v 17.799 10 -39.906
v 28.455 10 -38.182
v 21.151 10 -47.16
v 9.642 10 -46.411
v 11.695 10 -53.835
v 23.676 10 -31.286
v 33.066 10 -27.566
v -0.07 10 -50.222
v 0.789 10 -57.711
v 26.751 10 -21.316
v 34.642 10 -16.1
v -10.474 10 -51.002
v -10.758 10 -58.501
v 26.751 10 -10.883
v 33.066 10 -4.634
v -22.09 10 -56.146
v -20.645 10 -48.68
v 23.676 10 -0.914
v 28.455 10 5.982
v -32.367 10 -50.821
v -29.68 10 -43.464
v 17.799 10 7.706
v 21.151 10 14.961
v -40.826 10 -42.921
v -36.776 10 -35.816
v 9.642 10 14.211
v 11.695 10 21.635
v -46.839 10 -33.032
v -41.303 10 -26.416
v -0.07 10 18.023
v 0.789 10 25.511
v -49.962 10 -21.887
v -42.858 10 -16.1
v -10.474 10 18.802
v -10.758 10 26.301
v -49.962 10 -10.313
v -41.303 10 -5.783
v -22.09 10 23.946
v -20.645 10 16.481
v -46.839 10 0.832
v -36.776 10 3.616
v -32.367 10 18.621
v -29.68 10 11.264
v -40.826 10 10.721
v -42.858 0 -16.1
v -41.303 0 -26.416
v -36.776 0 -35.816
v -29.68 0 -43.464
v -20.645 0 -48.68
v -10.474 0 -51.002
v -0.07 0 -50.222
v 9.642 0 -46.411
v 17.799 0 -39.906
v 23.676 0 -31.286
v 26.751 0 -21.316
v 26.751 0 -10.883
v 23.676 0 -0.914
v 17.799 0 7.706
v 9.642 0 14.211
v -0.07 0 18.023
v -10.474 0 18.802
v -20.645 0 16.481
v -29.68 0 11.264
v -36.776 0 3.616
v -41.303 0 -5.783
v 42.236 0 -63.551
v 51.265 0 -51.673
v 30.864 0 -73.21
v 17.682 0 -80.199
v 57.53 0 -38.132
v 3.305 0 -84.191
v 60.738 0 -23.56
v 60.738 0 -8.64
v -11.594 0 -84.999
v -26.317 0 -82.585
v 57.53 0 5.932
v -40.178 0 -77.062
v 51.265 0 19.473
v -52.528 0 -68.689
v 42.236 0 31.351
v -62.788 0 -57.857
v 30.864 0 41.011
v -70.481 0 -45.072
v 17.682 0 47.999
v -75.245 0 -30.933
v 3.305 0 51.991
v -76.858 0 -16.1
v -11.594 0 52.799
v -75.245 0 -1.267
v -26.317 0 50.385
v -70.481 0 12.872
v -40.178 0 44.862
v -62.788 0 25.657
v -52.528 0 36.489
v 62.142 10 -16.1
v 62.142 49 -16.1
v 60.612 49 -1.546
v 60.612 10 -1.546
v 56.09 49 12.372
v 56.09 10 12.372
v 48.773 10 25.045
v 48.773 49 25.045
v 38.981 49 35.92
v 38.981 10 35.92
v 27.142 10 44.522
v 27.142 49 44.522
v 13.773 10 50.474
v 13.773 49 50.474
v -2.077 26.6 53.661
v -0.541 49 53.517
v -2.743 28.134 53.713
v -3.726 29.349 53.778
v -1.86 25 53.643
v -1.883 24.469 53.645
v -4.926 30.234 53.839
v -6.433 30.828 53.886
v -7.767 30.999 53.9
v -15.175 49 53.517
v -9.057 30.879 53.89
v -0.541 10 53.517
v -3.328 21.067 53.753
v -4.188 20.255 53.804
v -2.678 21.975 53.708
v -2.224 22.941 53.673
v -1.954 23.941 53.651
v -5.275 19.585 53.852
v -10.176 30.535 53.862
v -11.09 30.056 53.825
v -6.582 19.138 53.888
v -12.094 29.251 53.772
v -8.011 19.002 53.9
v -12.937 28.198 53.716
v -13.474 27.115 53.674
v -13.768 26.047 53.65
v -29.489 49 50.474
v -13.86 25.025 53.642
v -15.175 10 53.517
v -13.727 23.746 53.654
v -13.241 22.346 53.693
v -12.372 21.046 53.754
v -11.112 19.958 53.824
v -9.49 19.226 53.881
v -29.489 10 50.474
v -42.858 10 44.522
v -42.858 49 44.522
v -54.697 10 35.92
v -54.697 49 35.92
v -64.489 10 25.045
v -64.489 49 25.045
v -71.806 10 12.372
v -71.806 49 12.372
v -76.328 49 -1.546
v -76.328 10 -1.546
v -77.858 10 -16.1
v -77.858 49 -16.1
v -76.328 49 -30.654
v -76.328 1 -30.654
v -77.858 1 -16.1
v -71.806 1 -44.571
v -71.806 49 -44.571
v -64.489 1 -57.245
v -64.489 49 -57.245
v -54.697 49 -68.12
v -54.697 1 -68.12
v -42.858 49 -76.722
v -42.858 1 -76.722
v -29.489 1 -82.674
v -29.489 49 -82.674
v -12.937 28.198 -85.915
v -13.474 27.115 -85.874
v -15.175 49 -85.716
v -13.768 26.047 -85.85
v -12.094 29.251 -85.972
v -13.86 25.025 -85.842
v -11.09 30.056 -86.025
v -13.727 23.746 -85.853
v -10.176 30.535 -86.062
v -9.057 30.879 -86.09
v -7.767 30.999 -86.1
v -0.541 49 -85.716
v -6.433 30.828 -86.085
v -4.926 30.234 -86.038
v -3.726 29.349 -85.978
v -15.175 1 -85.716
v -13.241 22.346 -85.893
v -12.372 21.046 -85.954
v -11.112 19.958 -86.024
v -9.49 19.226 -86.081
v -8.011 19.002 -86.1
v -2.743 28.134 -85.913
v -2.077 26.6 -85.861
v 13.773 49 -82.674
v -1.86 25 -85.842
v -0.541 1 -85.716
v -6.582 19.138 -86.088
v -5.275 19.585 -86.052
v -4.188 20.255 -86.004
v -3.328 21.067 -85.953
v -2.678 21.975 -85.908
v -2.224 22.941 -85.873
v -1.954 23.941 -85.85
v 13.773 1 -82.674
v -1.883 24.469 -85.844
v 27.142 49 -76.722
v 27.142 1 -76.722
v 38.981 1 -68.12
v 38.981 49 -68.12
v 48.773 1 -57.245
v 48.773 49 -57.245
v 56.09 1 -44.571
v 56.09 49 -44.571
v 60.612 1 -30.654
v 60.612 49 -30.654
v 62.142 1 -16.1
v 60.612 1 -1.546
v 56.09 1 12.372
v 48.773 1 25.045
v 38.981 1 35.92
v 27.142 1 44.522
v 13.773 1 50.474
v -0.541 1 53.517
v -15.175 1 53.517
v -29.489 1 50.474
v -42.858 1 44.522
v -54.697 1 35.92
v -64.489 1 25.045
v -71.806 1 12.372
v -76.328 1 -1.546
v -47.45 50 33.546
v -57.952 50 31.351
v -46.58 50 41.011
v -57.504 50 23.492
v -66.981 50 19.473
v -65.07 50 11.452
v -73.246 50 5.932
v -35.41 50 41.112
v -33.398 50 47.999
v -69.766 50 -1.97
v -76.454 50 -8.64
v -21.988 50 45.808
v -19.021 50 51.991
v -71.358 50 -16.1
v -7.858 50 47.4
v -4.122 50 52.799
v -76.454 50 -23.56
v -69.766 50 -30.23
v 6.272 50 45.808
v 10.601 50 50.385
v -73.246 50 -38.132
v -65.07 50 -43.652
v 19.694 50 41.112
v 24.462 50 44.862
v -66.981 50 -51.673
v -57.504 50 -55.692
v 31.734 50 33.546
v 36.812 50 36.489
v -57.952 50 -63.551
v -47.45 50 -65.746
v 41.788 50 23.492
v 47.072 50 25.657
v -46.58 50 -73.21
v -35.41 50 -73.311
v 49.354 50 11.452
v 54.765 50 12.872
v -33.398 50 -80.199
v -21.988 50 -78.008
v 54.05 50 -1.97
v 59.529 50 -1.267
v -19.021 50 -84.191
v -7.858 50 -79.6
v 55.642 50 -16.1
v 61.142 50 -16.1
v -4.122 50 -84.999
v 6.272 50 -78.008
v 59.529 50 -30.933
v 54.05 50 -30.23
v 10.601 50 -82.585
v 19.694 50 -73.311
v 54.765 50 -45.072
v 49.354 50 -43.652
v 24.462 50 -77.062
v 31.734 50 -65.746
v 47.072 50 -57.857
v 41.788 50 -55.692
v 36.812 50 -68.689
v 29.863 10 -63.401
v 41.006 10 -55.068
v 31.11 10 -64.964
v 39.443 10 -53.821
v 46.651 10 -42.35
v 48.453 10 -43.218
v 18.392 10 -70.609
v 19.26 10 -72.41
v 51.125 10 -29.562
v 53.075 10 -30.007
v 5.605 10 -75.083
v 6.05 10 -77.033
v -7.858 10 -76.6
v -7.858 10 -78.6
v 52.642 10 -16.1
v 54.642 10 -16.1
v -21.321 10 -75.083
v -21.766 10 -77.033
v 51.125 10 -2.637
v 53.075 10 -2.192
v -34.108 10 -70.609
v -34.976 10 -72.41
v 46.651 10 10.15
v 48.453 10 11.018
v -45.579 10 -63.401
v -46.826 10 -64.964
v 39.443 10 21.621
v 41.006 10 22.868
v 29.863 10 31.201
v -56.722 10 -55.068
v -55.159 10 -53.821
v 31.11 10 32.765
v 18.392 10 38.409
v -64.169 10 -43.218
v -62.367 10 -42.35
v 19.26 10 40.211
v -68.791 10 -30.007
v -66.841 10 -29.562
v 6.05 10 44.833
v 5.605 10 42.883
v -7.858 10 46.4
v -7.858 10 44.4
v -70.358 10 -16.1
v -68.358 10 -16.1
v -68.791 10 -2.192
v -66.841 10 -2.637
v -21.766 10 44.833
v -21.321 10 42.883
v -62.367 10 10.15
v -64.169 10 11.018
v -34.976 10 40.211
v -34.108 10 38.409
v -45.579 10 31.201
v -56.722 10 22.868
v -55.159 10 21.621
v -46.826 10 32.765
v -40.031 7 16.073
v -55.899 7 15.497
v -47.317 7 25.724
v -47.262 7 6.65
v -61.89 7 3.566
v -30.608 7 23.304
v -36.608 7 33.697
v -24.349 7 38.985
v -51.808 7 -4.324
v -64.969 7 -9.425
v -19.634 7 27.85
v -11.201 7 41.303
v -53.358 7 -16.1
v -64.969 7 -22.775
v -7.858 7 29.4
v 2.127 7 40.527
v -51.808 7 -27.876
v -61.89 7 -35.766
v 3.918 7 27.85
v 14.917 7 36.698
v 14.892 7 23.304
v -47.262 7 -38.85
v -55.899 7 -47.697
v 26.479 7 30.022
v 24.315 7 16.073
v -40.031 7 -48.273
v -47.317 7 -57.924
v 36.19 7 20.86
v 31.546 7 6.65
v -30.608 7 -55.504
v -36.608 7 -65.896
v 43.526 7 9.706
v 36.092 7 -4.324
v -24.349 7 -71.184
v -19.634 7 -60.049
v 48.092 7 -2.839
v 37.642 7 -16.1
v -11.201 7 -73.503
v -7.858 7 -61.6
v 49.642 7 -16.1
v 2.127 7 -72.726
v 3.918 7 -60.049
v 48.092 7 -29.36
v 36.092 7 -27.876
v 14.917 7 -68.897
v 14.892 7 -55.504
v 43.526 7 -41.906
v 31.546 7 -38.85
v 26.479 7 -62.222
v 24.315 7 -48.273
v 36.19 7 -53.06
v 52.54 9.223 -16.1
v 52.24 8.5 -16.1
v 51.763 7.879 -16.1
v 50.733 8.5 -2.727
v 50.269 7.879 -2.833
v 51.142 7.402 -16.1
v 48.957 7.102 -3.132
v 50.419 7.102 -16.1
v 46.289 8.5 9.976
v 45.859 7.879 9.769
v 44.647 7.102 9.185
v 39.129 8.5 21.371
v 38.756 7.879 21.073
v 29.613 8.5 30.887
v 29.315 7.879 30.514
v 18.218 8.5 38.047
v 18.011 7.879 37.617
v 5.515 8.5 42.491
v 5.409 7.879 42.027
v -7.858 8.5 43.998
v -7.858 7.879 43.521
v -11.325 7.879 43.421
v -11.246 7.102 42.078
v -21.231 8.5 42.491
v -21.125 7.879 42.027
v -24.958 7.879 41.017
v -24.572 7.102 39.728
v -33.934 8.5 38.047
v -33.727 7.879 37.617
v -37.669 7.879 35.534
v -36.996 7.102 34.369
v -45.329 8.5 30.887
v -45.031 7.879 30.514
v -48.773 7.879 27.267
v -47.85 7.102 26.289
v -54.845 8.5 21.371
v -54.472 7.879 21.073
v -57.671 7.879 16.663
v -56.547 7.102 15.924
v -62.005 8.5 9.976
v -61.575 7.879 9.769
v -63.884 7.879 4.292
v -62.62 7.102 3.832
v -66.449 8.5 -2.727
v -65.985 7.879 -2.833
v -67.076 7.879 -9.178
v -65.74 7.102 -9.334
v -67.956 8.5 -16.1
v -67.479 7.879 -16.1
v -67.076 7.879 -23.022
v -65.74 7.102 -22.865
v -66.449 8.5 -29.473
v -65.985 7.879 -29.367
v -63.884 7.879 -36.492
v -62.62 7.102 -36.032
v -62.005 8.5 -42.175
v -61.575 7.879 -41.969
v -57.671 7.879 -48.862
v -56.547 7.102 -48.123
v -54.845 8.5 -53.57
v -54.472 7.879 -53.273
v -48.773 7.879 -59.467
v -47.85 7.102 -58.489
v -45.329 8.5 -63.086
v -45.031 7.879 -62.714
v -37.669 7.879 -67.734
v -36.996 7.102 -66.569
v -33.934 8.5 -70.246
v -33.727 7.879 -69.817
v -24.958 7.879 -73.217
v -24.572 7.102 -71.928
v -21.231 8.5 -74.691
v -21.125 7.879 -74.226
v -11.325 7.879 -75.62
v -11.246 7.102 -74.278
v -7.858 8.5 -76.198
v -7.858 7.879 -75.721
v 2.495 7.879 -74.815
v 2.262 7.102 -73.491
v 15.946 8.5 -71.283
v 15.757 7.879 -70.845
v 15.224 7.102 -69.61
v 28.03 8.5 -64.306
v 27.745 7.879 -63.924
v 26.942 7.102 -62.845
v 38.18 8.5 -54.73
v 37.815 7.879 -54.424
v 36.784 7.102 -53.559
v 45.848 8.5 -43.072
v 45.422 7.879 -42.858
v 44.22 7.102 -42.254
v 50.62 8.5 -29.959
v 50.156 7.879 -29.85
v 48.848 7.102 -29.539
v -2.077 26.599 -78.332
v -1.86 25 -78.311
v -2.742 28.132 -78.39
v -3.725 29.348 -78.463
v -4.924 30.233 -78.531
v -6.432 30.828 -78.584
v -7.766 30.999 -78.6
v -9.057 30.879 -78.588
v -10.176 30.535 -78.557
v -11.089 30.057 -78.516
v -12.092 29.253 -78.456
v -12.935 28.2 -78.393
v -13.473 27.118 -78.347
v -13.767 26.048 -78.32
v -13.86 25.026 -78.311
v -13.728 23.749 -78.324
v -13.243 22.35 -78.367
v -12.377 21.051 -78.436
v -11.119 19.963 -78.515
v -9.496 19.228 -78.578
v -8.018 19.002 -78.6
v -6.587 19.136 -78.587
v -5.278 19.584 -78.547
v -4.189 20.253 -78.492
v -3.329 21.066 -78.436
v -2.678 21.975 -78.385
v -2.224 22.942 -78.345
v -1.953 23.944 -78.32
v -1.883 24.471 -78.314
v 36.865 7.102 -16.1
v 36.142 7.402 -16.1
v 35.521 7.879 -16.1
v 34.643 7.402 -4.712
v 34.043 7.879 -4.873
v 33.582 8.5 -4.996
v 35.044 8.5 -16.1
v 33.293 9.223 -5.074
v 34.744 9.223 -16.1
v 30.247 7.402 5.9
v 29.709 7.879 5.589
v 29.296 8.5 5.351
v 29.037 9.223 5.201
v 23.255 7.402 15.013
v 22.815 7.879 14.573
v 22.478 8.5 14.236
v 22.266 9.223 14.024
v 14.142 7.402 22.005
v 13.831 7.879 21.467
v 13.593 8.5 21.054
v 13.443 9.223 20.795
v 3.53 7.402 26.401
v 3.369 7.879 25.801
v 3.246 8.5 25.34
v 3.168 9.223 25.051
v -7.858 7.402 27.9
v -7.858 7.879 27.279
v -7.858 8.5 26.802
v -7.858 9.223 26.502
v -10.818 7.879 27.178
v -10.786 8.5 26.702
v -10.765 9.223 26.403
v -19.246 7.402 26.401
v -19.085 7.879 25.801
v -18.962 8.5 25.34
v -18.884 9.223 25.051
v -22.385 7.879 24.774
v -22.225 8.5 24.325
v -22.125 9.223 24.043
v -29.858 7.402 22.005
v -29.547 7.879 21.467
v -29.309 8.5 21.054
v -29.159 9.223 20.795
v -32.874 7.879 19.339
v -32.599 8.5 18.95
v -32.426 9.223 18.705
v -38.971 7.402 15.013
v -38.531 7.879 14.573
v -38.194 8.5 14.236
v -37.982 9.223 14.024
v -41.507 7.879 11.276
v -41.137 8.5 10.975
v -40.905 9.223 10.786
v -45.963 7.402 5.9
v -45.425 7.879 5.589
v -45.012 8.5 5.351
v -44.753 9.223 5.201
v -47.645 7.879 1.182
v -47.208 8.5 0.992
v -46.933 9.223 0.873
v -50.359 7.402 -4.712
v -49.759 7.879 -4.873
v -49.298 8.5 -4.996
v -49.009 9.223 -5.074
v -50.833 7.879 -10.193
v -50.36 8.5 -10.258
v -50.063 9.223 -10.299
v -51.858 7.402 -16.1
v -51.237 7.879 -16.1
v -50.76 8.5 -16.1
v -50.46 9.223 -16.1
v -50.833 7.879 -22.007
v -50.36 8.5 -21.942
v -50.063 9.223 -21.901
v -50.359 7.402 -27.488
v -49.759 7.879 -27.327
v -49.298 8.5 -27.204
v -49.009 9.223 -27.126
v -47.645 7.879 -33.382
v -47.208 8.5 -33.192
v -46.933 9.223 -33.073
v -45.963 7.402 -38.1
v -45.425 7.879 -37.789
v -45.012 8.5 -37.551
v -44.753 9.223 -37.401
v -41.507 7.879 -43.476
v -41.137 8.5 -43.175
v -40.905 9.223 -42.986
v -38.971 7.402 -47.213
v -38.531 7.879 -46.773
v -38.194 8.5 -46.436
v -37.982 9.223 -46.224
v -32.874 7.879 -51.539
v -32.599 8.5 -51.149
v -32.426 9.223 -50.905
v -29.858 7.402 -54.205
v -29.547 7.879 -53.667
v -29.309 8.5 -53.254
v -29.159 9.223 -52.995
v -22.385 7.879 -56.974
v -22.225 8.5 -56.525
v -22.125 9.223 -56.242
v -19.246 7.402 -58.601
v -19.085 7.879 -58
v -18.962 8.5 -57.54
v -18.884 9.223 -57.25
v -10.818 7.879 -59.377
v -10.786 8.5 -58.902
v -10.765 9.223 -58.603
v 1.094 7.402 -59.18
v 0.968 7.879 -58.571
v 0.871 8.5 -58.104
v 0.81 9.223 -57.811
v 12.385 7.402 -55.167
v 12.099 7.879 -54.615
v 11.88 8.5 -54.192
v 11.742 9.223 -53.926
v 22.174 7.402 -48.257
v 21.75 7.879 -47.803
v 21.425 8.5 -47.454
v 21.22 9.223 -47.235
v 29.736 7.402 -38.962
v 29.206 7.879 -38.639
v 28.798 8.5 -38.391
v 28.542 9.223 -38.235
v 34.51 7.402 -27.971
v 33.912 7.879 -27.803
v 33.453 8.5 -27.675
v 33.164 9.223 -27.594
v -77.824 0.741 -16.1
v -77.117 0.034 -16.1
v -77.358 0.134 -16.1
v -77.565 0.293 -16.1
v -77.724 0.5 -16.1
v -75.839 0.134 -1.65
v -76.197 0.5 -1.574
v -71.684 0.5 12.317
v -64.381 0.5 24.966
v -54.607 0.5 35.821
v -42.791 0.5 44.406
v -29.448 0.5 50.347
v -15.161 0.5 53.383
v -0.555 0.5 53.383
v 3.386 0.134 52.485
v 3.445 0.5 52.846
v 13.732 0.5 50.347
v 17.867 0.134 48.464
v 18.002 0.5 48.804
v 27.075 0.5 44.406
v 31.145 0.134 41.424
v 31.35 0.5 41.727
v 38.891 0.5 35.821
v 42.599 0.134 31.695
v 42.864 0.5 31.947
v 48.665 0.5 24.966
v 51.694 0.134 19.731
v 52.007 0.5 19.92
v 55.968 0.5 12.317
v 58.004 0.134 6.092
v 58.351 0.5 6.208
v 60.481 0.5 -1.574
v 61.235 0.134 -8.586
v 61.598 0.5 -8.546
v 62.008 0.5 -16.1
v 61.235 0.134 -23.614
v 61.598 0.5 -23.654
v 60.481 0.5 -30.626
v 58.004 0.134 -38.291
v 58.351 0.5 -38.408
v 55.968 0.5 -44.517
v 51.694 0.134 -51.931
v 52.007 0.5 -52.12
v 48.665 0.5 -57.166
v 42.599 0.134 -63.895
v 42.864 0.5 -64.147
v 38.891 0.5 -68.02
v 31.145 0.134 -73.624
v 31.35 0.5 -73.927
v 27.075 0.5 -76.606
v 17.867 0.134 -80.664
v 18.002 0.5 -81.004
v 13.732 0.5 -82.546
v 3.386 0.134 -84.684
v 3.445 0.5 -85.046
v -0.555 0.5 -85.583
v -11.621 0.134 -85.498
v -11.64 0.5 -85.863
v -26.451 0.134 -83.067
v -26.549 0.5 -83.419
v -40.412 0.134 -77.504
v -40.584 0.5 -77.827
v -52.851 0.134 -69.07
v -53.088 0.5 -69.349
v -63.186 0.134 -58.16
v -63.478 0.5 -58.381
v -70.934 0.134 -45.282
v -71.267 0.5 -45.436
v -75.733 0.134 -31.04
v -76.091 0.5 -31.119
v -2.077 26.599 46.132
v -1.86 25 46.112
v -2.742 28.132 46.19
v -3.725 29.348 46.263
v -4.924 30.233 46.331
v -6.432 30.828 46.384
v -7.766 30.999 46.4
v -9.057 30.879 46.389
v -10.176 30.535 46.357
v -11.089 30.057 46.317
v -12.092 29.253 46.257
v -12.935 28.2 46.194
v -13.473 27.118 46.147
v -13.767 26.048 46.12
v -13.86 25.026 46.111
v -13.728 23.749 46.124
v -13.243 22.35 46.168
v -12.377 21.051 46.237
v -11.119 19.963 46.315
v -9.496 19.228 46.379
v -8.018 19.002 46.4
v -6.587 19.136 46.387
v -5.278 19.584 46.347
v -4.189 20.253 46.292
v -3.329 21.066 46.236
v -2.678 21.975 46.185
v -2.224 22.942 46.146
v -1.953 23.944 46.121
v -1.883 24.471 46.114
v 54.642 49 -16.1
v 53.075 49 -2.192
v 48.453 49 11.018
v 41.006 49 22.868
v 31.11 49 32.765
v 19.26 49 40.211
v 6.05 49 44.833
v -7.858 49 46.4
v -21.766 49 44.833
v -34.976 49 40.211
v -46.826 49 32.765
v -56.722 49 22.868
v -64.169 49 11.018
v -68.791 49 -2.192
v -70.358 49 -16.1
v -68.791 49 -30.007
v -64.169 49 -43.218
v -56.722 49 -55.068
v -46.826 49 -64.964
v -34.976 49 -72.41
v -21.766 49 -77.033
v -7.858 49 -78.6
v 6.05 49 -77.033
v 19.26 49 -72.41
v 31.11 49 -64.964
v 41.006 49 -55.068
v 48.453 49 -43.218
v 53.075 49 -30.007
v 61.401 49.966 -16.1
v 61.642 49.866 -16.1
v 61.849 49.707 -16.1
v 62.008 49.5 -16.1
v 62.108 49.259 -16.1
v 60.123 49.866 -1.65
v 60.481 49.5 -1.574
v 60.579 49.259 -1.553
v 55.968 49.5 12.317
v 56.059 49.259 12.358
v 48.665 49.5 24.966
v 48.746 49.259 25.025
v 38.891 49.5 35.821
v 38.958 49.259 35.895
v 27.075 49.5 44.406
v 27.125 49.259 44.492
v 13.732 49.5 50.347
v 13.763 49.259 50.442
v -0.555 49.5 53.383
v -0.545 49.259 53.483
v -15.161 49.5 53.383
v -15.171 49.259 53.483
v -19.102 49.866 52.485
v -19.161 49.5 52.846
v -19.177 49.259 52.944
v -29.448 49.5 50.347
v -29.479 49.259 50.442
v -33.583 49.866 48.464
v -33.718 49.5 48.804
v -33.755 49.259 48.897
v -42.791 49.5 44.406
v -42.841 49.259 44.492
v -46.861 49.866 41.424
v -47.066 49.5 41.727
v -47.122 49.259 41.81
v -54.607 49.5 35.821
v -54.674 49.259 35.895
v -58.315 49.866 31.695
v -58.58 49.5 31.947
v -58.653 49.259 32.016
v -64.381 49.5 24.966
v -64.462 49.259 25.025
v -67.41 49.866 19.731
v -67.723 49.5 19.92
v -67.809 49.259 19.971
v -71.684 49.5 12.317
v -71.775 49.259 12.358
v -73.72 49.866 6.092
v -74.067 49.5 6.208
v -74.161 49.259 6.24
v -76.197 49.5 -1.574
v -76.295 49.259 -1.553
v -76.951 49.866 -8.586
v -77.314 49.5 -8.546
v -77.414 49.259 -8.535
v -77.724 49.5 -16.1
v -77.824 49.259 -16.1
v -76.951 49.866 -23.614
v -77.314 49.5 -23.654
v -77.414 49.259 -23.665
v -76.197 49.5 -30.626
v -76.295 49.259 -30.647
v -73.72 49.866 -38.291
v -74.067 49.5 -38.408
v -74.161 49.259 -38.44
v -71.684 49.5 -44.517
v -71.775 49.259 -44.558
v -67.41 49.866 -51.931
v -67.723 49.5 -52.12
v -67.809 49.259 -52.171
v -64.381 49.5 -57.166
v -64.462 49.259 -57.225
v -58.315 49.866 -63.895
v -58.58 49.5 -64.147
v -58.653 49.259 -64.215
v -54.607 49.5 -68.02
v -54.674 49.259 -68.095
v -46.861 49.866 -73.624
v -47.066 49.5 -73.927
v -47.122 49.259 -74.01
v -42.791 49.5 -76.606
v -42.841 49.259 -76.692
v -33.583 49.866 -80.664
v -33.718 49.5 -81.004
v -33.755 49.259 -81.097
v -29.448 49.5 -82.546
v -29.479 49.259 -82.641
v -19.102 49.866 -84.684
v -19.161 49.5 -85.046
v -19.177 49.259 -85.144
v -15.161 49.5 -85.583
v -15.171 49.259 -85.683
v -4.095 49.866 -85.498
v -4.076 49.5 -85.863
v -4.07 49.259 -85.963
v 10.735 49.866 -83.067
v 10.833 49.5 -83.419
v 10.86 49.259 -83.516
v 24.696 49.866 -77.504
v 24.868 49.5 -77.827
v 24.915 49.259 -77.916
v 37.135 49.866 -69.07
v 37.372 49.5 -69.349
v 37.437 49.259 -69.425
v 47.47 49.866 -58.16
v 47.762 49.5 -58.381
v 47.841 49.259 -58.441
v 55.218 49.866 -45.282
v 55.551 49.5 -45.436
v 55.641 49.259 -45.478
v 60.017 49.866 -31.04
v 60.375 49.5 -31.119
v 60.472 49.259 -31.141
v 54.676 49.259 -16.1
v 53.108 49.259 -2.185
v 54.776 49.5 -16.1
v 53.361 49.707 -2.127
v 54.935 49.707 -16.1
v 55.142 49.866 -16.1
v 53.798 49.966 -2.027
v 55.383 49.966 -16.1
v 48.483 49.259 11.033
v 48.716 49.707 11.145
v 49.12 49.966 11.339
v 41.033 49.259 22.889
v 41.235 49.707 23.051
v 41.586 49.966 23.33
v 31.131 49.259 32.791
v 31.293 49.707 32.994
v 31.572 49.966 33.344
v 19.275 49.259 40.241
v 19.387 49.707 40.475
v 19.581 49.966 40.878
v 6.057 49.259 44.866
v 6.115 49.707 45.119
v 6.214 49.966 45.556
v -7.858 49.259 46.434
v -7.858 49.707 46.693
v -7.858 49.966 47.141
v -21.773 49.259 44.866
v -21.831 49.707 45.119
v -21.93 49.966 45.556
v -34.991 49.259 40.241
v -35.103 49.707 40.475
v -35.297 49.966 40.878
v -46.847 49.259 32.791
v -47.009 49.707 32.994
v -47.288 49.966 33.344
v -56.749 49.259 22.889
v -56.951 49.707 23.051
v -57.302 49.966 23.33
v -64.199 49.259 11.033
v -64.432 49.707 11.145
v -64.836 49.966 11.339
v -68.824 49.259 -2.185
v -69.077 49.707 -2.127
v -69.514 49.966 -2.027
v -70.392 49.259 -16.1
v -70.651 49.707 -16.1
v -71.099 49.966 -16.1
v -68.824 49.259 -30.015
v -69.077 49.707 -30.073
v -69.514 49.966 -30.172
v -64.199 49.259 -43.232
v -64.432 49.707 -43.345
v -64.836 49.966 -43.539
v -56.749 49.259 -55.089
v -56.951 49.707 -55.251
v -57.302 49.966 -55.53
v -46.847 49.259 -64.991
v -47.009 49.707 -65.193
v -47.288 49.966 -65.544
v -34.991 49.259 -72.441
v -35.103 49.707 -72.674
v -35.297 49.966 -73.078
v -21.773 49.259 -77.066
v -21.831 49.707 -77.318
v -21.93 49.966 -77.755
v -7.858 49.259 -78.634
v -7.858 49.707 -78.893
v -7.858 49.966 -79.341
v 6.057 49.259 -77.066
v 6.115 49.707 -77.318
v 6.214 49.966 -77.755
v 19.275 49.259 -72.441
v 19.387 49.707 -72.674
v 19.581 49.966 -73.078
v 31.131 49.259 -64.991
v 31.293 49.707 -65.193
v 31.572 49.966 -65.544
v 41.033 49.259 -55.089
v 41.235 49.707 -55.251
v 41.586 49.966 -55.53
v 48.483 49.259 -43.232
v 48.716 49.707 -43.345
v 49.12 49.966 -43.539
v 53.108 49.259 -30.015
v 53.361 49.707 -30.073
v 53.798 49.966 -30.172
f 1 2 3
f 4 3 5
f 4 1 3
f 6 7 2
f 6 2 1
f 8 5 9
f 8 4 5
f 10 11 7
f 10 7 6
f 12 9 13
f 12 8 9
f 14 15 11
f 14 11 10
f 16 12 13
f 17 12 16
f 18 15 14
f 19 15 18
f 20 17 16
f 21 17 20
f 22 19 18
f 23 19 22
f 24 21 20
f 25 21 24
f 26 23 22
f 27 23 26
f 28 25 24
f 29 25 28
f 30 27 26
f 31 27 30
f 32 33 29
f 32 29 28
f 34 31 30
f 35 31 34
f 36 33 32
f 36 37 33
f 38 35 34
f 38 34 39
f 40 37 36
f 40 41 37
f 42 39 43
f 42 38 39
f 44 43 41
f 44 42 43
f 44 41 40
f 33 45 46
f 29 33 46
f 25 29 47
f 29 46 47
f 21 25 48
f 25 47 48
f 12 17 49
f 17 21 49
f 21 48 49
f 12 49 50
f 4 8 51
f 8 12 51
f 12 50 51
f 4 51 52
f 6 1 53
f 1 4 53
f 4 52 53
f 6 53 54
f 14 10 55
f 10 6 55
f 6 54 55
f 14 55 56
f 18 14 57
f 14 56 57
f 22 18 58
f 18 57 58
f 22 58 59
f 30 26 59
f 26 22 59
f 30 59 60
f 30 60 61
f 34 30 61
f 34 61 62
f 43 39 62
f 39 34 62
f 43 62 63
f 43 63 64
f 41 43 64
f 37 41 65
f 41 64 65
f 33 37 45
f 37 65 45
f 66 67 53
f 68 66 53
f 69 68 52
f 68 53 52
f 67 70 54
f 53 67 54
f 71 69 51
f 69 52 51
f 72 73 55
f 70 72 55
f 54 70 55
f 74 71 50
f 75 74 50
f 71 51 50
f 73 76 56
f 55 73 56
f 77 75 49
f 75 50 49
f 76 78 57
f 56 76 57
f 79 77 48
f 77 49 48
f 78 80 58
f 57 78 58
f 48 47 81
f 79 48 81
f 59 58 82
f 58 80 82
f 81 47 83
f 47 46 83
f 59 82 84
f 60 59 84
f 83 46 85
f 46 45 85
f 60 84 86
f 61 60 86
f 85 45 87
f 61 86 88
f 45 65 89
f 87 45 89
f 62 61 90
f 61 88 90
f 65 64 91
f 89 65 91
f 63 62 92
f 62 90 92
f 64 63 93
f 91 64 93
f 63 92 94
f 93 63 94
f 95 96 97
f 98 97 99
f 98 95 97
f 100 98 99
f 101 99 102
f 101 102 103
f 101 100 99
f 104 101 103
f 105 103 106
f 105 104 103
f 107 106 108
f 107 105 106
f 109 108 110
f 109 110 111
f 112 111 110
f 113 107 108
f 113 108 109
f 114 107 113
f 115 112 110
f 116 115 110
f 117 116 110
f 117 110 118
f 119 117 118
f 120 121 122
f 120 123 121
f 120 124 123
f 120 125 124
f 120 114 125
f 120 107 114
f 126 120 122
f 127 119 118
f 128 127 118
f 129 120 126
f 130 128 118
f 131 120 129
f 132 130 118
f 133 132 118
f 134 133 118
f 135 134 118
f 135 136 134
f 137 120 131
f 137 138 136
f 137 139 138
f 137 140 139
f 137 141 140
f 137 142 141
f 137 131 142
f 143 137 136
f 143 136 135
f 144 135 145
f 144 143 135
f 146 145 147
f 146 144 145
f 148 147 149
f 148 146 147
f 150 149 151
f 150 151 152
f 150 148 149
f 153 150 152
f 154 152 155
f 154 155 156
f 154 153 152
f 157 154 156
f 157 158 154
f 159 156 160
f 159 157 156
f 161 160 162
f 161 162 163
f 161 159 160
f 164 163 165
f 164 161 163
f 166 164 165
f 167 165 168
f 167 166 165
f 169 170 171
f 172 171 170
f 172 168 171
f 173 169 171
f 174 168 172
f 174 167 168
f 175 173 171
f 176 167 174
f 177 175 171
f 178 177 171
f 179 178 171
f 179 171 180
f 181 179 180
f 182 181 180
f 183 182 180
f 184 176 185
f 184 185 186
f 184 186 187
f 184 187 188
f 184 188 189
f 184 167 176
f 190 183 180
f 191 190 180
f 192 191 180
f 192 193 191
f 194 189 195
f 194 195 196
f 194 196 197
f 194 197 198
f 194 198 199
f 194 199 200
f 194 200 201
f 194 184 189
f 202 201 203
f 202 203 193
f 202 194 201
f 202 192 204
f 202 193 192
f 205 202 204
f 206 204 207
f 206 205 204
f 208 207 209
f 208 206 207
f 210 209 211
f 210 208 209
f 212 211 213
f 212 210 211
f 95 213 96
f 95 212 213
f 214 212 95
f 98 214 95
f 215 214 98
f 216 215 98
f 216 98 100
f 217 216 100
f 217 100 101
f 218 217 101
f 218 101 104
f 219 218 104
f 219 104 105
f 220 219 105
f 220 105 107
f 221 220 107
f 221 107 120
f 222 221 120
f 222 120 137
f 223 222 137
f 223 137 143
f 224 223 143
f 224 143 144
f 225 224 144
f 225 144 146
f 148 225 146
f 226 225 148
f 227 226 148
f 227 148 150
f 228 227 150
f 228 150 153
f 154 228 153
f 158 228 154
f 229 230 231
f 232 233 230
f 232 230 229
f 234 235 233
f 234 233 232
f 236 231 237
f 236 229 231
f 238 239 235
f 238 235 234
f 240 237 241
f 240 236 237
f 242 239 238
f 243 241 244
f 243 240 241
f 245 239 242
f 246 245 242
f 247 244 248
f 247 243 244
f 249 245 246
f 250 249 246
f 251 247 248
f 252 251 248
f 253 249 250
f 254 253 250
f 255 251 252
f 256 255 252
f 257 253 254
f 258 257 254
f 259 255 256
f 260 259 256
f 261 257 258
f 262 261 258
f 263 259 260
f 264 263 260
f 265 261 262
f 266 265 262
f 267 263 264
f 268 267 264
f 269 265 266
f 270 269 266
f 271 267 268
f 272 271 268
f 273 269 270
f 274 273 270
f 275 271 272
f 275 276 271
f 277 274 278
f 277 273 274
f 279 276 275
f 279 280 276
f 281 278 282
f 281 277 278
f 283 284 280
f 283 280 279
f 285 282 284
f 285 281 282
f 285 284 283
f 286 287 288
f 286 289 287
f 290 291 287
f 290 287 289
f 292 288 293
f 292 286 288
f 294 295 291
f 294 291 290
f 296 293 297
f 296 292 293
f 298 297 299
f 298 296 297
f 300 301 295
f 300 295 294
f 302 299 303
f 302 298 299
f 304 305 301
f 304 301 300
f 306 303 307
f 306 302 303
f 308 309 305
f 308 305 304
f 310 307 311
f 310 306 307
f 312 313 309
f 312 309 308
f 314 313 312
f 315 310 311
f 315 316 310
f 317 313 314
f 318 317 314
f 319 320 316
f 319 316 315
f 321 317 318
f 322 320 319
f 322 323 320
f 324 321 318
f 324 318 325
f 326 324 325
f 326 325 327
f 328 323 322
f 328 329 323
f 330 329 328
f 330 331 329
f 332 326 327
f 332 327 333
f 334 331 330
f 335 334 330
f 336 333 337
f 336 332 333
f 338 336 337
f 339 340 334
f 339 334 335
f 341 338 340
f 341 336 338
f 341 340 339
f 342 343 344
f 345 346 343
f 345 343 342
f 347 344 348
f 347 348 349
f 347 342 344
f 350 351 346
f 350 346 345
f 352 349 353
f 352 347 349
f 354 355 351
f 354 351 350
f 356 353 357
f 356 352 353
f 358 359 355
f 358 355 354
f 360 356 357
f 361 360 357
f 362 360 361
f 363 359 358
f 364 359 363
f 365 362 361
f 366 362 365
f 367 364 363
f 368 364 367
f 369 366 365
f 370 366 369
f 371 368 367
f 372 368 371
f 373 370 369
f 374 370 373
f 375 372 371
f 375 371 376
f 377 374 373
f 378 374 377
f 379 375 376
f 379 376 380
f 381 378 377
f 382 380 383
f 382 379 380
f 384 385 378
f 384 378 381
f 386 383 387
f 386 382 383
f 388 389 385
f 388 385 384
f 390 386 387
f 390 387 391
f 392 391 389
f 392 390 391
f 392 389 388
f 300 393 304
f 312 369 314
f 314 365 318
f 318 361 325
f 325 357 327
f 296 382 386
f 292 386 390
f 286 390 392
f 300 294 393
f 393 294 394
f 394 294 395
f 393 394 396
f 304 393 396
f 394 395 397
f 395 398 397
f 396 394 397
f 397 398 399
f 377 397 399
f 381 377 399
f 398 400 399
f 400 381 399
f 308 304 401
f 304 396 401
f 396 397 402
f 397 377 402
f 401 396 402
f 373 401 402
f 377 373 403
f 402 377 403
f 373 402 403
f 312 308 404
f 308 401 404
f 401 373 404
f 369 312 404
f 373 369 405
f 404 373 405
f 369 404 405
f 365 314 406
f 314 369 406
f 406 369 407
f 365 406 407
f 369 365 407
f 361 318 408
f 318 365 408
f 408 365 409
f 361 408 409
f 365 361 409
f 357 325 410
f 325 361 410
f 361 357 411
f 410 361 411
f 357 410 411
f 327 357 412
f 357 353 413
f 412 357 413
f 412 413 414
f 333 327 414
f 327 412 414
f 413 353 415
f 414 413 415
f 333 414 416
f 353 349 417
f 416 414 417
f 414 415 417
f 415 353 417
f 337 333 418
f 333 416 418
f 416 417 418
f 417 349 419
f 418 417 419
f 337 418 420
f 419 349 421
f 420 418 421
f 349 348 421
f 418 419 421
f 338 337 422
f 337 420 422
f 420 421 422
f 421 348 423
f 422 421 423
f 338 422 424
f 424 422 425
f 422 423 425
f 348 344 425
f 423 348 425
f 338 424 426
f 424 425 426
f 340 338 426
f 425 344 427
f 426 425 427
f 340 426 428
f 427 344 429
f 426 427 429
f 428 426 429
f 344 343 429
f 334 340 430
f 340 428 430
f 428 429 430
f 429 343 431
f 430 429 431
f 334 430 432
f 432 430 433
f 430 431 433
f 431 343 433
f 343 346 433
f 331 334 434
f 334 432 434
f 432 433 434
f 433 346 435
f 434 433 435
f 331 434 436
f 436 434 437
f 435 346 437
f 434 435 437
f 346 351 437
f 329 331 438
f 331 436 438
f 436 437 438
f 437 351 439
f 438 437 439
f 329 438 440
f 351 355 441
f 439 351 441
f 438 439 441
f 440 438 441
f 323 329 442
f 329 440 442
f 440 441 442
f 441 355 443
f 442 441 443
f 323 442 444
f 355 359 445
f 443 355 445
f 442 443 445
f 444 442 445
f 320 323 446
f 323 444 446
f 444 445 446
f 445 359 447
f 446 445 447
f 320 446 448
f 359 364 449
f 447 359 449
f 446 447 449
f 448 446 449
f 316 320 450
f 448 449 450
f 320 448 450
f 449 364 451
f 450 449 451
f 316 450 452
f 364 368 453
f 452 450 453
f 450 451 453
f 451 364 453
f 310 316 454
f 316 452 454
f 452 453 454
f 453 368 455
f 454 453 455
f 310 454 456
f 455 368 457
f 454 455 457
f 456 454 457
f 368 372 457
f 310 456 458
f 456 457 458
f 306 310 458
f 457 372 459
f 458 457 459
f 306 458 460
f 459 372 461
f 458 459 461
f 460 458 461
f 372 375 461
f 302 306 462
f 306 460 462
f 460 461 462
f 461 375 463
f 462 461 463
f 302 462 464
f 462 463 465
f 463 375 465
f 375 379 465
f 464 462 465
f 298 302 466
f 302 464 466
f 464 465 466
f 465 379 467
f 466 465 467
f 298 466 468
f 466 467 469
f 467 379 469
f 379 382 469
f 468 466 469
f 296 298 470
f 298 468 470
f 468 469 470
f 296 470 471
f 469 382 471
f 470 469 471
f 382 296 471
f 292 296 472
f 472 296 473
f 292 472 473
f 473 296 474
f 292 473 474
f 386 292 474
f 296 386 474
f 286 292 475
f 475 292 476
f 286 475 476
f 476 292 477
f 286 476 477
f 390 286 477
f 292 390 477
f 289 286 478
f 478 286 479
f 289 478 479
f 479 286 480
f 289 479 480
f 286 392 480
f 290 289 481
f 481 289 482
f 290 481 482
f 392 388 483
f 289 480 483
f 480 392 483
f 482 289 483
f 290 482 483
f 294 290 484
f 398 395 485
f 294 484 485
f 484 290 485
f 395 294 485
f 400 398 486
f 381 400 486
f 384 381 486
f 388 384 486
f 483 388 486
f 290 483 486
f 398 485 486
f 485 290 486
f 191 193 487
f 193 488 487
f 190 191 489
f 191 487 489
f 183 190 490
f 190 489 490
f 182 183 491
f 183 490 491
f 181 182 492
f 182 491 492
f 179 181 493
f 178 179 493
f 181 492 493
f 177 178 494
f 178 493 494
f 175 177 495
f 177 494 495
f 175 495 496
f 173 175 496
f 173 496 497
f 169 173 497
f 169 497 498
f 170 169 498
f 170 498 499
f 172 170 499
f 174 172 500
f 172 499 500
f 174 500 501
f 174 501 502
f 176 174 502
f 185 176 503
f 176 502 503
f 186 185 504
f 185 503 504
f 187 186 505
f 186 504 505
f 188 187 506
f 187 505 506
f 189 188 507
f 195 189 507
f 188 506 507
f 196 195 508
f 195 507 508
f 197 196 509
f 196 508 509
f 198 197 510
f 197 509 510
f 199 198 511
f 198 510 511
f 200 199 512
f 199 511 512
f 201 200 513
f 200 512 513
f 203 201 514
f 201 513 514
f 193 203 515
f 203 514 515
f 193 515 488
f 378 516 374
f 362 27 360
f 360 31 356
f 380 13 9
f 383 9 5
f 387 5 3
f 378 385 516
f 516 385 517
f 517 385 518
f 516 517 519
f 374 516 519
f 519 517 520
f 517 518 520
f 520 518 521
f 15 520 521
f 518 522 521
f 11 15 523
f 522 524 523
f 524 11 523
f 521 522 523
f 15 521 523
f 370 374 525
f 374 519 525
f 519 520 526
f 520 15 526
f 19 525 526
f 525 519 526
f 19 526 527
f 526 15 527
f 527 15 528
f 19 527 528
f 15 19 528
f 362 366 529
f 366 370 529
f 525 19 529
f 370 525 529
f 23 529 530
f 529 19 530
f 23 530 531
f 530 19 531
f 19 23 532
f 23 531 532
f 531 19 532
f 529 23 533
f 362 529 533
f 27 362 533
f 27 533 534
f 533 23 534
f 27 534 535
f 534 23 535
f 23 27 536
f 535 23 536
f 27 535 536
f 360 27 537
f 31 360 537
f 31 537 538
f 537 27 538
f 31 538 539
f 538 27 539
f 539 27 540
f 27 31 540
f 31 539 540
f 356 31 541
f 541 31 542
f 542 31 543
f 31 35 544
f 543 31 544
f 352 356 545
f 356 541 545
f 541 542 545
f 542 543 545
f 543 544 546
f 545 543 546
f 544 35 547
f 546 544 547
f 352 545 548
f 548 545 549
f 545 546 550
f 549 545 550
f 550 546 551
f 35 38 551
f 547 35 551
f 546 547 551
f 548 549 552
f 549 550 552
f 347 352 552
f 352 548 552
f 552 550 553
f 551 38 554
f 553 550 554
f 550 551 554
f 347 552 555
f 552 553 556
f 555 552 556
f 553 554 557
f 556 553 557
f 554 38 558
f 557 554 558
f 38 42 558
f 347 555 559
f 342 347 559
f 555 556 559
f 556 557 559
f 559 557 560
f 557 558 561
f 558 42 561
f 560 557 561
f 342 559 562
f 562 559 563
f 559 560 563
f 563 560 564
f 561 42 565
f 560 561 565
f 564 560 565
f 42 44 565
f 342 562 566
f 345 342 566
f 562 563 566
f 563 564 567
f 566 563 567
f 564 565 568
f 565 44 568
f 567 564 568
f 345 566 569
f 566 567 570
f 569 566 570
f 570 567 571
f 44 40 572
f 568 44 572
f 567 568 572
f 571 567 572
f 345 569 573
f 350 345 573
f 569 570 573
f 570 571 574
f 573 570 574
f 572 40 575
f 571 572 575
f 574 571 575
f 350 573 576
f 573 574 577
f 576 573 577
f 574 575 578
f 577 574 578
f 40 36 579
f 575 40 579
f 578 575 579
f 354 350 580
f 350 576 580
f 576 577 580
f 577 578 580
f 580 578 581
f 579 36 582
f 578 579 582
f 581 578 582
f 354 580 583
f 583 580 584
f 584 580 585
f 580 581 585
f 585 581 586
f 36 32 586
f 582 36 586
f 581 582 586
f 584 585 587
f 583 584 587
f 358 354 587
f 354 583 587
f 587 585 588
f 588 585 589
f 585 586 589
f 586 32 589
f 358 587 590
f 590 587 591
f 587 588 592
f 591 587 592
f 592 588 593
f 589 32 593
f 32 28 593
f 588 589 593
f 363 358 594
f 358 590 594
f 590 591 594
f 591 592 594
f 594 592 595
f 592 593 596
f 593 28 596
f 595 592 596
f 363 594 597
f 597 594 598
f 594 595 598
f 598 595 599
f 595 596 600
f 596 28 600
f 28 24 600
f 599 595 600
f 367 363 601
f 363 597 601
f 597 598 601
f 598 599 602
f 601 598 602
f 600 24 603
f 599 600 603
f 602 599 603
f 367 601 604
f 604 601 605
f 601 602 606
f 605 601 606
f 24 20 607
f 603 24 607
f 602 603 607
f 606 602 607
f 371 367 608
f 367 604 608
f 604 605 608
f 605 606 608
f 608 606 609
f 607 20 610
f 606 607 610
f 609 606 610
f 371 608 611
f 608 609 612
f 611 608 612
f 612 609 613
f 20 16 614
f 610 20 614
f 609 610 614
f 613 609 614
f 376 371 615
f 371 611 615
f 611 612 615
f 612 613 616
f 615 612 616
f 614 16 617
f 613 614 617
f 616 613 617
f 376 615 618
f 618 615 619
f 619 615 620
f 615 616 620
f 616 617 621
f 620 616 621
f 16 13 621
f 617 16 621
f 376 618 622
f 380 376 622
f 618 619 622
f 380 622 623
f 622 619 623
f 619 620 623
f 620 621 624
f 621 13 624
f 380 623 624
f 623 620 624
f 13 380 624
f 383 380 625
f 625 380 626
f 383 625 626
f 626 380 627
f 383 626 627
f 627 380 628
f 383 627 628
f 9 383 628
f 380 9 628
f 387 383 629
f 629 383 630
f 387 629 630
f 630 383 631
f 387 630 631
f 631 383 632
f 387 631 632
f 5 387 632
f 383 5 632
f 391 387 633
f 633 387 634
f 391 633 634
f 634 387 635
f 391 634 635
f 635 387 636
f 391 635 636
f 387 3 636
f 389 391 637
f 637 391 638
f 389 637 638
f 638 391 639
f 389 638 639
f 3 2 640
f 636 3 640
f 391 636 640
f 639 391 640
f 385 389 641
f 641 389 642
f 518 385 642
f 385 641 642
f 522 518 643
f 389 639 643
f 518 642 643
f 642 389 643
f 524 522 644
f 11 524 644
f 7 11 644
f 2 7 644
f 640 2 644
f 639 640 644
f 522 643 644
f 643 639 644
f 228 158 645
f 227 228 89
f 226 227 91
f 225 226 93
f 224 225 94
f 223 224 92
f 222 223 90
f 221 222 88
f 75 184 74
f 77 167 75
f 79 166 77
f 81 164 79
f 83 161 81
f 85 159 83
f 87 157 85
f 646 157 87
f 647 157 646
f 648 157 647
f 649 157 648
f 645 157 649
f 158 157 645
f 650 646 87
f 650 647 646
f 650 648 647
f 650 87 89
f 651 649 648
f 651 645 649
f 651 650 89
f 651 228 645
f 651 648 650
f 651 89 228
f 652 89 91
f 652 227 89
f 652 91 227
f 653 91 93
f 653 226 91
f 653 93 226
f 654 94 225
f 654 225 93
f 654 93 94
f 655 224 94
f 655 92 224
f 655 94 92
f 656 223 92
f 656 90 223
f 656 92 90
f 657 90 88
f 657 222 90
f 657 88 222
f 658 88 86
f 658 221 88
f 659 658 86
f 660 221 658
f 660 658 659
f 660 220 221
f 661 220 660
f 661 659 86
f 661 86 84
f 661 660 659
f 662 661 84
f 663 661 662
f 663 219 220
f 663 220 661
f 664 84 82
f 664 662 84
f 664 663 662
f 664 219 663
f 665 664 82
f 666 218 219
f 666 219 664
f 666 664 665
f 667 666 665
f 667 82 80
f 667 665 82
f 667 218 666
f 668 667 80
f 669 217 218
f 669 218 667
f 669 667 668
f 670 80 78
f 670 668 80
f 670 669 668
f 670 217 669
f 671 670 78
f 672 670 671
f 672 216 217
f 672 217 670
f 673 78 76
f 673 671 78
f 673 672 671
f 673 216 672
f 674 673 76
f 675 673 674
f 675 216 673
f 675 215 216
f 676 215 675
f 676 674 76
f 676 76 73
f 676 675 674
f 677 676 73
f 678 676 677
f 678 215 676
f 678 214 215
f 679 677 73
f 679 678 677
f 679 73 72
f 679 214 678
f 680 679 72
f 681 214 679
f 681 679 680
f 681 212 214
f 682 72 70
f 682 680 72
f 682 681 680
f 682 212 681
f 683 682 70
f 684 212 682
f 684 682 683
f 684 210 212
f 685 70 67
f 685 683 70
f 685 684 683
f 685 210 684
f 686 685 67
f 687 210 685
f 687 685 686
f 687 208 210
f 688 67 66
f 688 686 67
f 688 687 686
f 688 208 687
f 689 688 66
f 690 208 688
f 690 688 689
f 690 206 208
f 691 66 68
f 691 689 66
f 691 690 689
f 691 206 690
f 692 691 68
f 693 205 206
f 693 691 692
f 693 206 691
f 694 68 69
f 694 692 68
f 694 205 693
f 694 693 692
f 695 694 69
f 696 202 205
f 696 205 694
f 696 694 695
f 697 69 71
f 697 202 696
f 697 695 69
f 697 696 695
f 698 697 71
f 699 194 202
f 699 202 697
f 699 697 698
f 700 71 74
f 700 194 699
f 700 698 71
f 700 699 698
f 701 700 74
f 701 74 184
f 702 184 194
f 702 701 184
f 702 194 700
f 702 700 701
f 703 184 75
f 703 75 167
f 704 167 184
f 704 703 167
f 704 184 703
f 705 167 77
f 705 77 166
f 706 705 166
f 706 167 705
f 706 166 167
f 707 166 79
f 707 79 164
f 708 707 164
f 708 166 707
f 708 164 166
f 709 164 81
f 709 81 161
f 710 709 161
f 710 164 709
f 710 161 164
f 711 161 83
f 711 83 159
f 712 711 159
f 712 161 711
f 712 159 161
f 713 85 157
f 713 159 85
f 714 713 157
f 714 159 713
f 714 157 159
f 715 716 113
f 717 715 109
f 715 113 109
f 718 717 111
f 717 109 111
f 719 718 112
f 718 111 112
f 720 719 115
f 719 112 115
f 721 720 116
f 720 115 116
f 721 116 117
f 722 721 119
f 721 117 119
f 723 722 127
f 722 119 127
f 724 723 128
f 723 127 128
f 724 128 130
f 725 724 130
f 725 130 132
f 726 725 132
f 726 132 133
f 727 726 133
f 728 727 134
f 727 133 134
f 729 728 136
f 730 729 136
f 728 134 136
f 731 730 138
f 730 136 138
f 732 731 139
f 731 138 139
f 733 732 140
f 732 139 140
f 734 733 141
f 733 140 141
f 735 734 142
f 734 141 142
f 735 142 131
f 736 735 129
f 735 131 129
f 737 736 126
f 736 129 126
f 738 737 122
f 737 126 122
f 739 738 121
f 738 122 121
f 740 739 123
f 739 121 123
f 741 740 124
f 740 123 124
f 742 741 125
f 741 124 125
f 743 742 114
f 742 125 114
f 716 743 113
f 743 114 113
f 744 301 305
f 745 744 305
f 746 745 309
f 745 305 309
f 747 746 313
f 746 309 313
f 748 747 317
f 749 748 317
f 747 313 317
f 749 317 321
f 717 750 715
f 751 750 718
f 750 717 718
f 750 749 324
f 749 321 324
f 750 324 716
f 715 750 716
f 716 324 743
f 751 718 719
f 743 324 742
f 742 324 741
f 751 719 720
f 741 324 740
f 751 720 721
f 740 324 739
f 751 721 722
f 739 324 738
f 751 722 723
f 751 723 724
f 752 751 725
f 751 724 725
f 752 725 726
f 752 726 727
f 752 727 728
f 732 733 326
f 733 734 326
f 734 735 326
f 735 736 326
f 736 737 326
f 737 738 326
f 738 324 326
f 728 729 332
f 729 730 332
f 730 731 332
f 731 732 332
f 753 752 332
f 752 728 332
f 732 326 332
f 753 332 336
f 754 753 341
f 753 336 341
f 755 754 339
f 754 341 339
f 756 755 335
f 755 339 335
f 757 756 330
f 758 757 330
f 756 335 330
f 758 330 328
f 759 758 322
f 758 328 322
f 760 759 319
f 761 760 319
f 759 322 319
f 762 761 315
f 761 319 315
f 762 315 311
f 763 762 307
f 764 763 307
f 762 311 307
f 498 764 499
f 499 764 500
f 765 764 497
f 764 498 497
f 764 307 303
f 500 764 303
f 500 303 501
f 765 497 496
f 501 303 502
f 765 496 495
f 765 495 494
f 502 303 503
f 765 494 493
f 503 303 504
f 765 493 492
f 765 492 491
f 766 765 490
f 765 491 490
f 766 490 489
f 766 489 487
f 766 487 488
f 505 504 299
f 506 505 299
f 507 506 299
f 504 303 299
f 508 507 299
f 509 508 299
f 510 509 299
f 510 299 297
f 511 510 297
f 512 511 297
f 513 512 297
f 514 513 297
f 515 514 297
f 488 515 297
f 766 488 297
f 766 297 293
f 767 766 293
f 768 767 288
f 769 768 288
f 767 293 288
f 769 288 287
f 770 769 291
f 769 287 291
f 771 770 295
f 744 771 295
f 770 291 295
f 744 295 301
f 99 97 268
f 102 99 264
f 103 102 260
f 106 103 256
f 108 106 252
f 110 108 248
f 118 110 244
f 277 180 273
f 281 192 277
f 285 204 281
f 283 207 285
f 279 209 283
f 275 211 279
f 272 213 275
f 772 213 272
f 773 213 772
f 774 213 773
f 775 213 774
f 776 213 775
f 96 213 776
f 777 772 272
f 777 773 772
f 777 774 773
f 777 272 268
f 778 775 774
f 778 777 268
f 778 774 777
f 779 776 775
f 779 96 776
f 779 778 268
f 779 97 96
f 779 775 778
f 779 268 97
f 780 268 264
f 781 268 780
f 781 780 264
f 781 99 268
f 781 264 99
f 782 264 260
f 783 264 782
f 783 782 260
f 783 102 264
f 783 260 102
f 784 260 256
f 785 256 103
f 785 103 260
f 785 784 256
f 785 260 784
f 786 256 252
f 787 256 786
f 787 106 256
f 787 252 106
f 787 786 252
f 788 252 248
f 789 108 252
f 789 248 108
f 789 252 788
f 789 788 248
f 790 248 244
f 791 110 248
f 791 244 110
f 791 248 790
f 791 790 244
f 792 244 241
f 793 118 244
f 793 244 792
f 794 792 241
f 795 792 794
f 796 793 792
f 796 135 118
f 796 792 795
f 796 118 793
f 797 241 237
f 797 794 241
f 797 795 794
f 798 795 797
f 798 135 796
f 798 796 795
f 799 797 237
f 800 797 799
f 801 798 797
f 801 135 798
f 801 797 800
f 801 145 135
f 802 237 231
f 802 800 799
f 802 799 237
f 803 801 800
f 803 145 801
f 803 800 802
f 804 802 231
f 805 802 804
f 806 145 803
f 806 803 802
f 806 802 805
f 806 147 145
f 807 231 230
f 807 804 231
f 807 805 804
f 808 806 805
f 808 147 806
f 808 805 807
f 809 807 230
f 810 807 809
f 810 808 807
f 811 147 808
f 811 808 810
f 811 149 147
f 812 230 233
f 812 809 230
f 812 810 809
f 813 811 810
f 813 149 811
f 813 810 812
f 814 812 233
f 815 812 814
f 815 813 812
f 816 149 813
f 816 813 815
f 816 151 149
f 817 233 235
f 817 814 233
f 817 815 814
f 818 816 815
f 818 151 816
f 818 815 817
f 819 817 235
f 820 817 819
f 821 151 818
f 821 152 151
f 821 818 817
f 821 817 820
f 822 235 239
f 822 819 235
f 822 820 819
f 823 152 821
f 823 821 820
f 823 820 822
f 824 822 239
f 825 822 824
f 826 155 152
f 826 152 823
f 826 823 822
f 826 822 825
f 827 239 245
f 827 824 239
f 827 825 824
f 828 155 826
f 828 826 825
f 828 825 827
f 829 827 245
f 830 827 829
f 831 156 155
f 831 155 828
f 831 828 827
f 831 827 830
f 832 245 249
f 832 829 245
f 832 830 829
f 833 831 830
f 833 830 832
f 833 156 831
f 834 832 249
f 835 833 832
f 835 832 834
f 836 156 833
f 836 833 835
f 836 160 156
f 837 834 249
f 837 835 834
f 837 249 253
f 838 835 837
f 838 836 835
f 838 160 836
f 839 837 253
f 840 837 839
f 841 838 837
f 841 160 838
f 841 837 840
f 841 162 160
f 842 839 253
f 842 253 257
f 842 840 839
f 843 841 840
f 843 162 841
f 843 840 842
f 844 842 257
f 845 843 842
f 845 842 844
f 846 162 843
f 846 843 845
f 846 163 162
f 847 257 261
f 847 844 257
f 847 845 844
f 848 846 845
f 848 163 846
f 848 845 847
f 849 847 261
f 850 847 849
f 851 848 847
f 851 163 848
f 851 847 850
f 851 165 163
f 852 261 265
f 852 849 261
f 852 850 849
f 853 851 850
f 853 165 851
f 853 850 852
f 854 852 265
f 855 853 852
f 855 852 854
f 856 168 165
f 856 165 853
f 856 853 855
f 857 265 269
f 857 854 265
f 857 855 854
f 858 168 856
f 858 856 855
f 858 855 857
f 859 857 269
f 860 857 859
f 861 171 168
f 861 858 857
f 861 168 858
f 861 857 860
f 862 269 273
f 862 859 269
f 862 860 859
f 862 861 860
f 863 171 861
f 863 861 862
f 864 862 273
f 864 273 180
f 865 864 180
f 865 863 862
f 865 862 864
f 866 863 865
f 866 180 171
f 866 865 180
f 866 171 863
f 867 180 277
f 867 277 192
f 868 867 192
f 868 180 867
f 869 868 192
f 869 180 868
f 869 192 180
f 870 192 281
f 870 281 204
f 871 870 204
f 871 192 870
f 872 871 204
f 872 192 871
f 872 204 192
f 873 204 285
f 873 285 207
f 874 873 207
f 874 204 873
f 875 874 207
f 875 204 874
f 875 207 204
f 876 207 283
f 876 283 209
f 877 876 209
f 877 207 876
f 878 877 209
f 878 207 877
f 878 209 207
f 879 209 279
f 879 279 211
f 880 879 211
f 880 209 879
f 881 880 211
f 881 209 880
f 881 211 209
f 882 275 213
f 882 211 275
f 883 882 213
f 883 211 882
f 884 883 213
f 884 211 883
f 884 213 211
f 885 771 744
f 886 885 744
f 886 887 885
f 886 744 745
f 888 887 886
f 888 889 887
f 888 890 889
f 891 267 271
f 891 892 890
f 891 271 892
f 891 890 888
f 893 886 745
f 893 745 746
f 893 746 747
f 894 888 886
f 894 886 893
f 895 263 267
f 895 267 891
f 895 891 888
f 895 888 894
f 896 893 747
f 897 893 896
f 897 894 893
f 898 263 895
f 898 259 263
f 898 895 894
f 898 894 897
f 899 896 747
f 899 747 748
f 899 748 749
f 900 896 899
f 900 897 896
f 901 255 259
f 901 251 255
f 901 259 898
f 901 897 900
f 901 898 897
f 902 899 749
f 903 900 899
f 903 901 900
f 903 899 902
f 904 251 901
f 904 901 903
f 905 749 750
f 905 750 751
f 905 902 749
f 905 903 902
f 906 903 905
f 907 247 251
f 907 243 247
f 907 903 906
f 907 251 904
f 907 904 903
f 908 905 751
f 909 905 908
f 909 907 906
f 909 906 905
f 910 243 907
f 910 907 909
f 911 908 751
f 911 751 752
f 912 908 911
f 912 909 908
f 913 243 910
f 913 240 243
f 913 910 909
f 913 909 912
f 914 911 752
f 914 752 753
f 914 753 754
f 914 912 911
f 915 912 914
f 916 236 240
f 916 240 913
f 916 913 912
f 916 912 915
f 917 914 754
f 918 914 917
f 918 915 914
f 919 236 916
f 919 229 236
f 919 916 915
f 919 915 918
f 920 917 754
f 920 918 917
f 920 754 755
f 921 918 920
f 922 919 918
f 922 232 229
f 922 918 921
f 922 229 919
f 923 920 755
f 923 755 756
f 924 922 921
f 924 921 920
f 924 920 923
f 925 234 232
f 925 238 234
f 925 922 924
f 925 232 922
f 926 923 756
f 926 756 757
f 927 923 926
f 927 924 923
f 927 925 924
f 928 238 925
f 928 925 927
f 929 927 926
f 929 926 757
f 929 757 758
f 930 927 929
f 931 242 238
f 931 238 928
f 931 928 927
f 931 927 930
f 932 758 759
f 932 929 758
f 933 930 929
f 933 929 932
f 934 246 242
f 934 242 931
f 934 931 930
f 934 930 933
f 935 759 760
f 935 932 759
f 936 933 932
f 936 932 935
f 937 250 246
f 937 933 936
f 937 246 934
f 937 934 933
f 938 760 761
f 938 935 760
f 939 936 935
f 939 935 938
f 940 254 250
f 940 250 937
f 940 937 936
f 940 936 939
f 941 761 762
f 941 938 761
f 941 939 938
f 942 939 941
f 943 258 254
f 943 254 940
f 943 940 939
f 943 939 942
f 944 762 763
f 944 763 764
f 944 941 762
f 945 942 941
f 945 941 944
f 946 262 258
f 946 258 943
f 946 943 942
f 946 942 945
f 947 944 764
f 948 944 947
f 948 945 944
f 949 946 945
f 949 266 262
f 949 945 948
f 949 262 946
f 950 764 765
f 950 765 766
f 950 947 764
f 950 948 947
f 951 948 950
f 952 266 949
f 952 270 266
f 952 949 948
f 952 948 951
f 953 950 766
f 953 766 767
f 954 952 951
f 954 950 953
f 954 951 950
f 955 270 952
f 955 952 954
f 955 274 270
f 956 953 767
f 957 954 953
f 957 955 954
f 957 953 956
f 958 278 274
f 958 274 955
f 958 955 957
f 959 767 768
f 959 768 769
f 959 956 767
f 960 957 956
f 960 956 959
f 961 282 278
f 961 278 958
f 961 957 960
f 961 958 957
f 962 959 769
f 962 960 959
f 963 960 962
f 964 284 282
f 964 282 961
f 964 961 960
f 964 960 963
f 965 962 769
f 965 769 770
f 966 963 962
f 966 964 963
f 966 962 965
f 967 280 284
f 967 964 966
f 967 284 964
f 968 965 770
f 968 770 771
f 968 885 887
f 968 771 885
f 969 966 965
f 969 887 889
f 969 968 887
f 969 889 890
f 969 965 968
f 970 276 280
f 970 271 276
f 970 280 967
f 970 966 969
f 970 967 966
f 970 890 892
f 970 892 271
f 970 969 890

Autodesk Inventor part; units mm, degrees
ref_plane "YZ Plane" through (0, 0, 0) normal (1, 0, 0) x (0, 1, 0)
ref_plane "XZ Plane" through (0, 0, 0) normal (0, 1, 0) x (-1, 0, 0)
ref_plane "XY Plane" through (0, 0, 0) normal (0, 0, 1) x (1, 0, 0)
sketch "Sketch1" plane through (0, 0, 0) normal (0, 1, 0) x (-1, 0, 0)
  circle A0 centre (7.858, -16.0999) radius 70
  circle A1 centre (7.858, -16.0999) radius 35
  point P0 (0, 0)
  dimension "d0" = 140
  dimension "d1" = 70
extrude "Extrusion1" add sketch "Sketch1" along normal blind 10
sketch "Sketch2" plane through (-7.858, 10, -16.0999) normal (0, 1, 0) x (1, 0, 0)
  circle A0 centre (0, 0) radius 70
  circle A1 centre (0, 0) radius 62.5
  line L0 (0, 0) -> (69.5, 0)
  line L1 (69.5, 0) -> (69.5, 27.6538)
  line L2 (69.5, 27.6538) -> (69.5, -15.3132)
  line L3 (0, 0) -> (-69.5, 0)
  line L4 (-69.5, 0) -> (-69.5, 45.4592)
  point P0 (7.858, -16.0999)
  dimension "d4" = 125
  dimension "d14" = 140
  dimension "d19" = 69.5
  dimension "d20" = 69.5
extrude "Extrusion2" add sketch "Sketch2" along normal blind 40 contours A0 L2 L1 | L1 L0 A1 L3 L4 A0 | A0 L4 L3 A1 L0 L2
sketch "Sketch3" plane through (-7.858, 10, -16.0999) normal (0, 1, 0) x (1, 0, 0)
  circle A0 centre (0, 0) radius 42.5
  circle A1 centre (0, 0) radius 60.5
  point P0 (7.858, -16.0999)
  dimension "d7" = 85
extrude "Extrusion3" cut sketch "Sketch3" against normal blind 3
fillet "Fillet1" radius 3 1 edges at (-68.358, 7, -16.0999)
fillet "Fillet2" radius 3 1 edges at (-50.358, 7, -16.0999)
fillet "Fillet3" radius 1 2 edges at (-77.858, 50, -16.0999) (-70.358, 50, -16.0999)
fillet "Fillet4" radius 1 1 edges at (62.142, 0, -16.0999)
sketch "Sketch4" plane through (0, 0, 0) normal (0, 1, 0) x (-1, 0, 0)
  point P0 (0, 0)
sketch "Sketch5" plane through (0, 0, 0) normal (0, 0, 1) x (1, 0, 0)
  line L0 (-77.858, 1) -> (62.142, 1) projected
  line L1 (62.1388, 1) -> (-77.858, 49)
  line L2 (62.142, 49) -> (-77.858, 49) projected
  circle A0 centre (-7.8596, 25) radius 6
  point P0 (0, 0)
  dimension "d15" = 12
extrude "Extrusion4" cut sketch "Sketch5" along normal mid plane 300
properties part number "Rolamento_Inferior_Base"
